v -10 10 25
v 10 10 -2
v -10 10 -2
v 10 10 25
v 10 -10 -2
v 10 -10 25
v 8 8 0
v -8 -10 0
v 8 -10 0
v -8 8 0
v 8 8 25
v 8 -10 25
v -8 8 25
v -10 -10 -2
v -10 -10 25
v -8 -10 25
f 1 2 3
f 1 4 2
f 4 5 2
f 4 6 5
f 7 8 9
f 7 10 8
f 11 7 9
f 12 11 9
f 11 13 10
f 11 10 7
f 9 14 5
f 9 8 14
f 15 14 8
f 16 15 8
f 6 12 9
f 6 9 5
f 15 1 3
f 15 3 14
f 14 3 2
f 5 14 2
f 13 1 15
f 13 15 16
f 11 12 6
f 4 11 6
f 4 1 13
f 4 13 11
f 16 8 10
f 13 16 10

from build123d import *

# Parameters (mm, degrees)
F1_DEPTH = 25
F0_W     = 16
F0_H     = 18
F2_DEPTH = 2


with BuildPart() as f1:
    # F0 (on Top) → F1 (new body)
    with BuildSketch(Plane.XY):
        Polygon((10, 10), (-10, 10), (-10, -10), (-8, -10), (-8, 8), (8, 8), (8, -10), (10, -10), align=None)
    extrude(amount=F1_DEPTH)

    # F0 (on Top) → F2 (join)
    with BuildSketch(Plane.XY):
        Polygon((10, 10), (-10, 10), (-10, -10), (-8, -10), (-8, 8), (8, 8), (8, -10), (10, -10), align=None)
        with Locations((0, -1)):
            Rectangle(F0_W, F0_H)
    extrude(amount=-F2_DEPTH)


solid = f1.part
